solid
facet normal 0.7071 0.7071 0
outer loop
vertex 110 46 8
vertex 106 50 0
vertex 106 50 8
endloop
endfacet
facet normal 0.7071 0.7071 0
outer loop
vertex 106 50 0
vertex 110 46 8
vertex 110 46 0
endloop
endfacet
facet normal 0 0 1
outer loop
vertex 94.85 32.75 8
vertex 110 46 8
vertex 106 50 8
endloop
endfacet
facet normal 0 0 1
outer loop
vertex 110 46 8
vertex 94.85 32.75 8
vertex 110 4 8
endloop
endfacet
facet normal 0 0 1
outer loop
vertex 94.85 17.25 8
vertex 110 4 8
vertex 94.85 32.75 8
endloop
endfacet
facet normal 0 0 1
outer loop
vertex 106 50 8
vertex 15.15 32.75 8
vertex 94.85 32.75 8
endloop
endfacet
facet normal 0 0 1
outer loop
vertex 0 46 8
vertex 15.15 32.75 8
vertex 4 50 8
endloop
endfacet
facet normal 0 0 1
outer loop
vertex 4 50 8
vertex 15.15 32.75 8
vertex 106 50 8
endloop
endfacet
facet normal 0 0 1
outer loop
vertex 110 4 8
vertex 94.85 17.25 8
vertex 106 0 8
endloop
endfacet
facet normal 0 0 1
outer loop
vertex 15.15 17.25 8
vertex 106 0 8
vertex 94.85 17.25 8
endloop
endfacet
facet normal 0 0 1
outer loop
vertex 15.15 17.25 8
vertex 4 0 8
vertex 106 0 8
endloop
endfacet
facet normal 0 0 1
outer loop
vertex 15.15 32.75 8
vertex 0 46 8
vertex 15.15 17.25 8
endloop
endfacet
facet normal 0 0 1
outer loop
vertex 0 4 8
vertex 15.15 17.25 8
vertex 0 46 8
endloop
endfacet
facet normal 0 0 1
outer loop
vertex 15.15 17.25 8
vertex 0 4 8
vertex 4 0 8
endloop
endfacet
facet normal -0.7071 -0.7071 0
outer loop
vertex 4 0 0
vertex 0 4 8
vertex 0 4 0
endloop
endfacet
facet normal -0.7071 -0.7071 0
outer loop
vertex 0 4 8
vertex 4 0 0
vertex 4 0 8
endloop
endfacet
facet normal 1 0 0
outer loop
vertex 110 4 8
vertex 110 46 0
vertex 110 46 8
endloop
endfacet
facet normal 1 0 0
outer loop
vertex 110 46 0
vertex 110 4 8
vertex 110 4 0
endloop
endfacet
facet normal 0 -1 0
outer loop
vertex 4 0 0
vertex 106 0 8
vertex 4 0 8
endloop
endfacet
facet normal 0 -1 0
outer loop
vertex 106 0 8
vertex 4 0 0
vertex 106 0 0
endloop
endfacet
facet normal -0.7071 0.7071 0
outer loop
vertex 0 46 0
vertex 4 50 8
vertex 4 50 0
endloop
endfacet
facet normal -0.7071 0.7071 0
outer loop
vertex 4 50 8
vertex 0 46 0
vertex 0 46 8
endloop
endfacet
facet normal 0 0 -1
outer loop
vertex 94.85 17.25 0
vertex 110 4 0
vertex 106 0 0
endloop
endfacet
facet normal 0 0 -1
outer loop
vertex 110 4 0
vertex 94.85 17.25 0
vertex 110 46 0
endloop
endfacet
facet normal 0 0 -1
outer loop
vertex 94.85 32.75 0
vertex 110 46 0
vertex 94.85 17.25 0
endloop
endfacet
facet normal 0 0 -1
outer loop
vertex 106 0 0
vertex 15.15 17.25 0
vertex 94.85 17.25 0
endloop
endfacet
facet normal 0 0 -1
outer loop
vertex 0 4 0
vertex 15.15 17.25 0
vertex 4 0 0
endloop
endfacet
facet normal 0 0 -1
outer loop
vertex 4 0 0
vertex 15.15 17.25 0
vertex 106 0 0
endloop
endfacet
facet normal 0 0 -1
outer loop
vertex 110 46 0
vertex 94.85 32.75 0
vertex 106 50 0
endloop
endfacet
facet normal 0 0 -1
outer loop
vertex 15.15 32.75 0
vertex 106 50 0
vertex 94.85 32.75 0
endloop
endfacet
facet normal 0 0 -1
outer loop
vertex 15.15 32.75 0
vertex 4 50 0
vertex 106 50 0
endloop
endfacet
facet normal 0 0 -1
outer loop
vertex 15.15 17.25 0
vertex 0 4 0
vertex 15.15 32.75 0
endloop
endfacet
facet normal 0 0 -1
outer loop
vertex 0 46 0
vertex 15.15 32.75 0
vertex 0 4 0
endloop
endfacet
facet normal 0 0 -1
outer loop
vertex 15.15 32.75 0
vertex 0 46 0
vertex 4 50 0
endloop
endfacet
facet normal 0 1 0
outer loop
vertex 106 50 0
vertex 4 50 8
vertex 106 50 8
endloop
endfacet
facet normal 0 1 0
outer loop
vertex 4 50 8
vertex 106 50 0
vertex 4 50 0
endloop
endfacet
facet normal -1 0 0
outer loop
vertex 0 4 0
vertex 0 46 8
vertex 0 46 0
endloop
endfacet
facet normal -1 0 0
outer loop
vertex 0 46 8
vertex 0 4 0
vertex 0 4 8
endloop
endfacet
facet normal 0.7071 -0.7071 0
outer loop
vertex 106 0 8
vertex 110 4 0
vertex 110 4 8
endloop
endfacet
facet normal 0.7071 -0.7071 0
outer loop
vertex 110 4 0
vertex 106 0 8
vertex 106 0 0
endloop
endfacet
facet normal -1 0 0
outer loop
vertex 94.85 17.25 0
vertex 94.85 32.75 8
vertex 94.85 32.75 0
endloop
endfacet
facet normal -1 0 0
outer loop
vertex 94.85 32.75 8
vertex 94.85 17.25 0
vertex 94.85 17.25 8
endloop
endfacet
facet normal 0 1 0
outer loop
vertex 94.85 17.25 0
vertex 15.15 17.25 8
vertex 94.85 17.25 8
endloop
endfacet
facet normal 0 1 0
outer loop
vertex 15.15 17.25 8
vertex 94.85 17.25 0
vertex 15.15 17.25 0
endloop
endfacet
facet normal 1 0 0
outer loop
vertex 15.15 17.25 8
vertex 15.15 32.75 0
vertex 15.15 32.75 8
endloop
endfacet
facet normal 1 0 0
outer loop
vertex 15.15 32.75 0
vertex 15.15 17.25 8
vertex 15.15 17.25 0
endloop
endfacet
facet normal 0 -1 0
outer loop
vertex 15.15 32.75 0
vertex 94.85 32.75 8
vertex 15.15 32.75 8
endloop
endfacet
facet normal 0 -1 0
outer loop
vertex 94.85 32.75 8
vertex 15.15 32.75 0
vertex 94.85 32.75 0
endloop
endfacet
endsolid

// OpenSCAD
$fn = 32;

// ----------------------------------------------------------------------
// Windowed plate: 1 voids, 110 x 50 x 8 mm
// ----------------------------------------------------------------------

// --- parameters (mm) ---
plate_l = 110;            // plate length, X
plate_w = 50;             // plate width, Y
plate_t = 8;              // plate thickness, Z
edge_margin = 12;         // wall from the plate edge to any window
win1_l = 79.7;            // window length
win1_w = 15.5;            // window width
depth_1 = 8;              // depth of void 1 (full thickness = through)
corner_c = 4;             // corner chamfer of the plate

profile = [[4, 0], [106, 0], [110, 4], [110, 46], [106, 50], [4, 50], [0, 46], [0, 4]];  // primary outline, 8 points, counter clockwise
void_1 = [[15.15, 17.25], [94.85, 17.25], [94.85, 32.75], [15.15, 32.75]];  // large central window, 4 points

// --- the one profile operation ---
difference() {
  linear_extrude(height = plate_t) polygon(points = profile);
  translate([0, 0, -1])
    linear_extrude(height = plate_t + 2) polygon(points = void_1);
}
